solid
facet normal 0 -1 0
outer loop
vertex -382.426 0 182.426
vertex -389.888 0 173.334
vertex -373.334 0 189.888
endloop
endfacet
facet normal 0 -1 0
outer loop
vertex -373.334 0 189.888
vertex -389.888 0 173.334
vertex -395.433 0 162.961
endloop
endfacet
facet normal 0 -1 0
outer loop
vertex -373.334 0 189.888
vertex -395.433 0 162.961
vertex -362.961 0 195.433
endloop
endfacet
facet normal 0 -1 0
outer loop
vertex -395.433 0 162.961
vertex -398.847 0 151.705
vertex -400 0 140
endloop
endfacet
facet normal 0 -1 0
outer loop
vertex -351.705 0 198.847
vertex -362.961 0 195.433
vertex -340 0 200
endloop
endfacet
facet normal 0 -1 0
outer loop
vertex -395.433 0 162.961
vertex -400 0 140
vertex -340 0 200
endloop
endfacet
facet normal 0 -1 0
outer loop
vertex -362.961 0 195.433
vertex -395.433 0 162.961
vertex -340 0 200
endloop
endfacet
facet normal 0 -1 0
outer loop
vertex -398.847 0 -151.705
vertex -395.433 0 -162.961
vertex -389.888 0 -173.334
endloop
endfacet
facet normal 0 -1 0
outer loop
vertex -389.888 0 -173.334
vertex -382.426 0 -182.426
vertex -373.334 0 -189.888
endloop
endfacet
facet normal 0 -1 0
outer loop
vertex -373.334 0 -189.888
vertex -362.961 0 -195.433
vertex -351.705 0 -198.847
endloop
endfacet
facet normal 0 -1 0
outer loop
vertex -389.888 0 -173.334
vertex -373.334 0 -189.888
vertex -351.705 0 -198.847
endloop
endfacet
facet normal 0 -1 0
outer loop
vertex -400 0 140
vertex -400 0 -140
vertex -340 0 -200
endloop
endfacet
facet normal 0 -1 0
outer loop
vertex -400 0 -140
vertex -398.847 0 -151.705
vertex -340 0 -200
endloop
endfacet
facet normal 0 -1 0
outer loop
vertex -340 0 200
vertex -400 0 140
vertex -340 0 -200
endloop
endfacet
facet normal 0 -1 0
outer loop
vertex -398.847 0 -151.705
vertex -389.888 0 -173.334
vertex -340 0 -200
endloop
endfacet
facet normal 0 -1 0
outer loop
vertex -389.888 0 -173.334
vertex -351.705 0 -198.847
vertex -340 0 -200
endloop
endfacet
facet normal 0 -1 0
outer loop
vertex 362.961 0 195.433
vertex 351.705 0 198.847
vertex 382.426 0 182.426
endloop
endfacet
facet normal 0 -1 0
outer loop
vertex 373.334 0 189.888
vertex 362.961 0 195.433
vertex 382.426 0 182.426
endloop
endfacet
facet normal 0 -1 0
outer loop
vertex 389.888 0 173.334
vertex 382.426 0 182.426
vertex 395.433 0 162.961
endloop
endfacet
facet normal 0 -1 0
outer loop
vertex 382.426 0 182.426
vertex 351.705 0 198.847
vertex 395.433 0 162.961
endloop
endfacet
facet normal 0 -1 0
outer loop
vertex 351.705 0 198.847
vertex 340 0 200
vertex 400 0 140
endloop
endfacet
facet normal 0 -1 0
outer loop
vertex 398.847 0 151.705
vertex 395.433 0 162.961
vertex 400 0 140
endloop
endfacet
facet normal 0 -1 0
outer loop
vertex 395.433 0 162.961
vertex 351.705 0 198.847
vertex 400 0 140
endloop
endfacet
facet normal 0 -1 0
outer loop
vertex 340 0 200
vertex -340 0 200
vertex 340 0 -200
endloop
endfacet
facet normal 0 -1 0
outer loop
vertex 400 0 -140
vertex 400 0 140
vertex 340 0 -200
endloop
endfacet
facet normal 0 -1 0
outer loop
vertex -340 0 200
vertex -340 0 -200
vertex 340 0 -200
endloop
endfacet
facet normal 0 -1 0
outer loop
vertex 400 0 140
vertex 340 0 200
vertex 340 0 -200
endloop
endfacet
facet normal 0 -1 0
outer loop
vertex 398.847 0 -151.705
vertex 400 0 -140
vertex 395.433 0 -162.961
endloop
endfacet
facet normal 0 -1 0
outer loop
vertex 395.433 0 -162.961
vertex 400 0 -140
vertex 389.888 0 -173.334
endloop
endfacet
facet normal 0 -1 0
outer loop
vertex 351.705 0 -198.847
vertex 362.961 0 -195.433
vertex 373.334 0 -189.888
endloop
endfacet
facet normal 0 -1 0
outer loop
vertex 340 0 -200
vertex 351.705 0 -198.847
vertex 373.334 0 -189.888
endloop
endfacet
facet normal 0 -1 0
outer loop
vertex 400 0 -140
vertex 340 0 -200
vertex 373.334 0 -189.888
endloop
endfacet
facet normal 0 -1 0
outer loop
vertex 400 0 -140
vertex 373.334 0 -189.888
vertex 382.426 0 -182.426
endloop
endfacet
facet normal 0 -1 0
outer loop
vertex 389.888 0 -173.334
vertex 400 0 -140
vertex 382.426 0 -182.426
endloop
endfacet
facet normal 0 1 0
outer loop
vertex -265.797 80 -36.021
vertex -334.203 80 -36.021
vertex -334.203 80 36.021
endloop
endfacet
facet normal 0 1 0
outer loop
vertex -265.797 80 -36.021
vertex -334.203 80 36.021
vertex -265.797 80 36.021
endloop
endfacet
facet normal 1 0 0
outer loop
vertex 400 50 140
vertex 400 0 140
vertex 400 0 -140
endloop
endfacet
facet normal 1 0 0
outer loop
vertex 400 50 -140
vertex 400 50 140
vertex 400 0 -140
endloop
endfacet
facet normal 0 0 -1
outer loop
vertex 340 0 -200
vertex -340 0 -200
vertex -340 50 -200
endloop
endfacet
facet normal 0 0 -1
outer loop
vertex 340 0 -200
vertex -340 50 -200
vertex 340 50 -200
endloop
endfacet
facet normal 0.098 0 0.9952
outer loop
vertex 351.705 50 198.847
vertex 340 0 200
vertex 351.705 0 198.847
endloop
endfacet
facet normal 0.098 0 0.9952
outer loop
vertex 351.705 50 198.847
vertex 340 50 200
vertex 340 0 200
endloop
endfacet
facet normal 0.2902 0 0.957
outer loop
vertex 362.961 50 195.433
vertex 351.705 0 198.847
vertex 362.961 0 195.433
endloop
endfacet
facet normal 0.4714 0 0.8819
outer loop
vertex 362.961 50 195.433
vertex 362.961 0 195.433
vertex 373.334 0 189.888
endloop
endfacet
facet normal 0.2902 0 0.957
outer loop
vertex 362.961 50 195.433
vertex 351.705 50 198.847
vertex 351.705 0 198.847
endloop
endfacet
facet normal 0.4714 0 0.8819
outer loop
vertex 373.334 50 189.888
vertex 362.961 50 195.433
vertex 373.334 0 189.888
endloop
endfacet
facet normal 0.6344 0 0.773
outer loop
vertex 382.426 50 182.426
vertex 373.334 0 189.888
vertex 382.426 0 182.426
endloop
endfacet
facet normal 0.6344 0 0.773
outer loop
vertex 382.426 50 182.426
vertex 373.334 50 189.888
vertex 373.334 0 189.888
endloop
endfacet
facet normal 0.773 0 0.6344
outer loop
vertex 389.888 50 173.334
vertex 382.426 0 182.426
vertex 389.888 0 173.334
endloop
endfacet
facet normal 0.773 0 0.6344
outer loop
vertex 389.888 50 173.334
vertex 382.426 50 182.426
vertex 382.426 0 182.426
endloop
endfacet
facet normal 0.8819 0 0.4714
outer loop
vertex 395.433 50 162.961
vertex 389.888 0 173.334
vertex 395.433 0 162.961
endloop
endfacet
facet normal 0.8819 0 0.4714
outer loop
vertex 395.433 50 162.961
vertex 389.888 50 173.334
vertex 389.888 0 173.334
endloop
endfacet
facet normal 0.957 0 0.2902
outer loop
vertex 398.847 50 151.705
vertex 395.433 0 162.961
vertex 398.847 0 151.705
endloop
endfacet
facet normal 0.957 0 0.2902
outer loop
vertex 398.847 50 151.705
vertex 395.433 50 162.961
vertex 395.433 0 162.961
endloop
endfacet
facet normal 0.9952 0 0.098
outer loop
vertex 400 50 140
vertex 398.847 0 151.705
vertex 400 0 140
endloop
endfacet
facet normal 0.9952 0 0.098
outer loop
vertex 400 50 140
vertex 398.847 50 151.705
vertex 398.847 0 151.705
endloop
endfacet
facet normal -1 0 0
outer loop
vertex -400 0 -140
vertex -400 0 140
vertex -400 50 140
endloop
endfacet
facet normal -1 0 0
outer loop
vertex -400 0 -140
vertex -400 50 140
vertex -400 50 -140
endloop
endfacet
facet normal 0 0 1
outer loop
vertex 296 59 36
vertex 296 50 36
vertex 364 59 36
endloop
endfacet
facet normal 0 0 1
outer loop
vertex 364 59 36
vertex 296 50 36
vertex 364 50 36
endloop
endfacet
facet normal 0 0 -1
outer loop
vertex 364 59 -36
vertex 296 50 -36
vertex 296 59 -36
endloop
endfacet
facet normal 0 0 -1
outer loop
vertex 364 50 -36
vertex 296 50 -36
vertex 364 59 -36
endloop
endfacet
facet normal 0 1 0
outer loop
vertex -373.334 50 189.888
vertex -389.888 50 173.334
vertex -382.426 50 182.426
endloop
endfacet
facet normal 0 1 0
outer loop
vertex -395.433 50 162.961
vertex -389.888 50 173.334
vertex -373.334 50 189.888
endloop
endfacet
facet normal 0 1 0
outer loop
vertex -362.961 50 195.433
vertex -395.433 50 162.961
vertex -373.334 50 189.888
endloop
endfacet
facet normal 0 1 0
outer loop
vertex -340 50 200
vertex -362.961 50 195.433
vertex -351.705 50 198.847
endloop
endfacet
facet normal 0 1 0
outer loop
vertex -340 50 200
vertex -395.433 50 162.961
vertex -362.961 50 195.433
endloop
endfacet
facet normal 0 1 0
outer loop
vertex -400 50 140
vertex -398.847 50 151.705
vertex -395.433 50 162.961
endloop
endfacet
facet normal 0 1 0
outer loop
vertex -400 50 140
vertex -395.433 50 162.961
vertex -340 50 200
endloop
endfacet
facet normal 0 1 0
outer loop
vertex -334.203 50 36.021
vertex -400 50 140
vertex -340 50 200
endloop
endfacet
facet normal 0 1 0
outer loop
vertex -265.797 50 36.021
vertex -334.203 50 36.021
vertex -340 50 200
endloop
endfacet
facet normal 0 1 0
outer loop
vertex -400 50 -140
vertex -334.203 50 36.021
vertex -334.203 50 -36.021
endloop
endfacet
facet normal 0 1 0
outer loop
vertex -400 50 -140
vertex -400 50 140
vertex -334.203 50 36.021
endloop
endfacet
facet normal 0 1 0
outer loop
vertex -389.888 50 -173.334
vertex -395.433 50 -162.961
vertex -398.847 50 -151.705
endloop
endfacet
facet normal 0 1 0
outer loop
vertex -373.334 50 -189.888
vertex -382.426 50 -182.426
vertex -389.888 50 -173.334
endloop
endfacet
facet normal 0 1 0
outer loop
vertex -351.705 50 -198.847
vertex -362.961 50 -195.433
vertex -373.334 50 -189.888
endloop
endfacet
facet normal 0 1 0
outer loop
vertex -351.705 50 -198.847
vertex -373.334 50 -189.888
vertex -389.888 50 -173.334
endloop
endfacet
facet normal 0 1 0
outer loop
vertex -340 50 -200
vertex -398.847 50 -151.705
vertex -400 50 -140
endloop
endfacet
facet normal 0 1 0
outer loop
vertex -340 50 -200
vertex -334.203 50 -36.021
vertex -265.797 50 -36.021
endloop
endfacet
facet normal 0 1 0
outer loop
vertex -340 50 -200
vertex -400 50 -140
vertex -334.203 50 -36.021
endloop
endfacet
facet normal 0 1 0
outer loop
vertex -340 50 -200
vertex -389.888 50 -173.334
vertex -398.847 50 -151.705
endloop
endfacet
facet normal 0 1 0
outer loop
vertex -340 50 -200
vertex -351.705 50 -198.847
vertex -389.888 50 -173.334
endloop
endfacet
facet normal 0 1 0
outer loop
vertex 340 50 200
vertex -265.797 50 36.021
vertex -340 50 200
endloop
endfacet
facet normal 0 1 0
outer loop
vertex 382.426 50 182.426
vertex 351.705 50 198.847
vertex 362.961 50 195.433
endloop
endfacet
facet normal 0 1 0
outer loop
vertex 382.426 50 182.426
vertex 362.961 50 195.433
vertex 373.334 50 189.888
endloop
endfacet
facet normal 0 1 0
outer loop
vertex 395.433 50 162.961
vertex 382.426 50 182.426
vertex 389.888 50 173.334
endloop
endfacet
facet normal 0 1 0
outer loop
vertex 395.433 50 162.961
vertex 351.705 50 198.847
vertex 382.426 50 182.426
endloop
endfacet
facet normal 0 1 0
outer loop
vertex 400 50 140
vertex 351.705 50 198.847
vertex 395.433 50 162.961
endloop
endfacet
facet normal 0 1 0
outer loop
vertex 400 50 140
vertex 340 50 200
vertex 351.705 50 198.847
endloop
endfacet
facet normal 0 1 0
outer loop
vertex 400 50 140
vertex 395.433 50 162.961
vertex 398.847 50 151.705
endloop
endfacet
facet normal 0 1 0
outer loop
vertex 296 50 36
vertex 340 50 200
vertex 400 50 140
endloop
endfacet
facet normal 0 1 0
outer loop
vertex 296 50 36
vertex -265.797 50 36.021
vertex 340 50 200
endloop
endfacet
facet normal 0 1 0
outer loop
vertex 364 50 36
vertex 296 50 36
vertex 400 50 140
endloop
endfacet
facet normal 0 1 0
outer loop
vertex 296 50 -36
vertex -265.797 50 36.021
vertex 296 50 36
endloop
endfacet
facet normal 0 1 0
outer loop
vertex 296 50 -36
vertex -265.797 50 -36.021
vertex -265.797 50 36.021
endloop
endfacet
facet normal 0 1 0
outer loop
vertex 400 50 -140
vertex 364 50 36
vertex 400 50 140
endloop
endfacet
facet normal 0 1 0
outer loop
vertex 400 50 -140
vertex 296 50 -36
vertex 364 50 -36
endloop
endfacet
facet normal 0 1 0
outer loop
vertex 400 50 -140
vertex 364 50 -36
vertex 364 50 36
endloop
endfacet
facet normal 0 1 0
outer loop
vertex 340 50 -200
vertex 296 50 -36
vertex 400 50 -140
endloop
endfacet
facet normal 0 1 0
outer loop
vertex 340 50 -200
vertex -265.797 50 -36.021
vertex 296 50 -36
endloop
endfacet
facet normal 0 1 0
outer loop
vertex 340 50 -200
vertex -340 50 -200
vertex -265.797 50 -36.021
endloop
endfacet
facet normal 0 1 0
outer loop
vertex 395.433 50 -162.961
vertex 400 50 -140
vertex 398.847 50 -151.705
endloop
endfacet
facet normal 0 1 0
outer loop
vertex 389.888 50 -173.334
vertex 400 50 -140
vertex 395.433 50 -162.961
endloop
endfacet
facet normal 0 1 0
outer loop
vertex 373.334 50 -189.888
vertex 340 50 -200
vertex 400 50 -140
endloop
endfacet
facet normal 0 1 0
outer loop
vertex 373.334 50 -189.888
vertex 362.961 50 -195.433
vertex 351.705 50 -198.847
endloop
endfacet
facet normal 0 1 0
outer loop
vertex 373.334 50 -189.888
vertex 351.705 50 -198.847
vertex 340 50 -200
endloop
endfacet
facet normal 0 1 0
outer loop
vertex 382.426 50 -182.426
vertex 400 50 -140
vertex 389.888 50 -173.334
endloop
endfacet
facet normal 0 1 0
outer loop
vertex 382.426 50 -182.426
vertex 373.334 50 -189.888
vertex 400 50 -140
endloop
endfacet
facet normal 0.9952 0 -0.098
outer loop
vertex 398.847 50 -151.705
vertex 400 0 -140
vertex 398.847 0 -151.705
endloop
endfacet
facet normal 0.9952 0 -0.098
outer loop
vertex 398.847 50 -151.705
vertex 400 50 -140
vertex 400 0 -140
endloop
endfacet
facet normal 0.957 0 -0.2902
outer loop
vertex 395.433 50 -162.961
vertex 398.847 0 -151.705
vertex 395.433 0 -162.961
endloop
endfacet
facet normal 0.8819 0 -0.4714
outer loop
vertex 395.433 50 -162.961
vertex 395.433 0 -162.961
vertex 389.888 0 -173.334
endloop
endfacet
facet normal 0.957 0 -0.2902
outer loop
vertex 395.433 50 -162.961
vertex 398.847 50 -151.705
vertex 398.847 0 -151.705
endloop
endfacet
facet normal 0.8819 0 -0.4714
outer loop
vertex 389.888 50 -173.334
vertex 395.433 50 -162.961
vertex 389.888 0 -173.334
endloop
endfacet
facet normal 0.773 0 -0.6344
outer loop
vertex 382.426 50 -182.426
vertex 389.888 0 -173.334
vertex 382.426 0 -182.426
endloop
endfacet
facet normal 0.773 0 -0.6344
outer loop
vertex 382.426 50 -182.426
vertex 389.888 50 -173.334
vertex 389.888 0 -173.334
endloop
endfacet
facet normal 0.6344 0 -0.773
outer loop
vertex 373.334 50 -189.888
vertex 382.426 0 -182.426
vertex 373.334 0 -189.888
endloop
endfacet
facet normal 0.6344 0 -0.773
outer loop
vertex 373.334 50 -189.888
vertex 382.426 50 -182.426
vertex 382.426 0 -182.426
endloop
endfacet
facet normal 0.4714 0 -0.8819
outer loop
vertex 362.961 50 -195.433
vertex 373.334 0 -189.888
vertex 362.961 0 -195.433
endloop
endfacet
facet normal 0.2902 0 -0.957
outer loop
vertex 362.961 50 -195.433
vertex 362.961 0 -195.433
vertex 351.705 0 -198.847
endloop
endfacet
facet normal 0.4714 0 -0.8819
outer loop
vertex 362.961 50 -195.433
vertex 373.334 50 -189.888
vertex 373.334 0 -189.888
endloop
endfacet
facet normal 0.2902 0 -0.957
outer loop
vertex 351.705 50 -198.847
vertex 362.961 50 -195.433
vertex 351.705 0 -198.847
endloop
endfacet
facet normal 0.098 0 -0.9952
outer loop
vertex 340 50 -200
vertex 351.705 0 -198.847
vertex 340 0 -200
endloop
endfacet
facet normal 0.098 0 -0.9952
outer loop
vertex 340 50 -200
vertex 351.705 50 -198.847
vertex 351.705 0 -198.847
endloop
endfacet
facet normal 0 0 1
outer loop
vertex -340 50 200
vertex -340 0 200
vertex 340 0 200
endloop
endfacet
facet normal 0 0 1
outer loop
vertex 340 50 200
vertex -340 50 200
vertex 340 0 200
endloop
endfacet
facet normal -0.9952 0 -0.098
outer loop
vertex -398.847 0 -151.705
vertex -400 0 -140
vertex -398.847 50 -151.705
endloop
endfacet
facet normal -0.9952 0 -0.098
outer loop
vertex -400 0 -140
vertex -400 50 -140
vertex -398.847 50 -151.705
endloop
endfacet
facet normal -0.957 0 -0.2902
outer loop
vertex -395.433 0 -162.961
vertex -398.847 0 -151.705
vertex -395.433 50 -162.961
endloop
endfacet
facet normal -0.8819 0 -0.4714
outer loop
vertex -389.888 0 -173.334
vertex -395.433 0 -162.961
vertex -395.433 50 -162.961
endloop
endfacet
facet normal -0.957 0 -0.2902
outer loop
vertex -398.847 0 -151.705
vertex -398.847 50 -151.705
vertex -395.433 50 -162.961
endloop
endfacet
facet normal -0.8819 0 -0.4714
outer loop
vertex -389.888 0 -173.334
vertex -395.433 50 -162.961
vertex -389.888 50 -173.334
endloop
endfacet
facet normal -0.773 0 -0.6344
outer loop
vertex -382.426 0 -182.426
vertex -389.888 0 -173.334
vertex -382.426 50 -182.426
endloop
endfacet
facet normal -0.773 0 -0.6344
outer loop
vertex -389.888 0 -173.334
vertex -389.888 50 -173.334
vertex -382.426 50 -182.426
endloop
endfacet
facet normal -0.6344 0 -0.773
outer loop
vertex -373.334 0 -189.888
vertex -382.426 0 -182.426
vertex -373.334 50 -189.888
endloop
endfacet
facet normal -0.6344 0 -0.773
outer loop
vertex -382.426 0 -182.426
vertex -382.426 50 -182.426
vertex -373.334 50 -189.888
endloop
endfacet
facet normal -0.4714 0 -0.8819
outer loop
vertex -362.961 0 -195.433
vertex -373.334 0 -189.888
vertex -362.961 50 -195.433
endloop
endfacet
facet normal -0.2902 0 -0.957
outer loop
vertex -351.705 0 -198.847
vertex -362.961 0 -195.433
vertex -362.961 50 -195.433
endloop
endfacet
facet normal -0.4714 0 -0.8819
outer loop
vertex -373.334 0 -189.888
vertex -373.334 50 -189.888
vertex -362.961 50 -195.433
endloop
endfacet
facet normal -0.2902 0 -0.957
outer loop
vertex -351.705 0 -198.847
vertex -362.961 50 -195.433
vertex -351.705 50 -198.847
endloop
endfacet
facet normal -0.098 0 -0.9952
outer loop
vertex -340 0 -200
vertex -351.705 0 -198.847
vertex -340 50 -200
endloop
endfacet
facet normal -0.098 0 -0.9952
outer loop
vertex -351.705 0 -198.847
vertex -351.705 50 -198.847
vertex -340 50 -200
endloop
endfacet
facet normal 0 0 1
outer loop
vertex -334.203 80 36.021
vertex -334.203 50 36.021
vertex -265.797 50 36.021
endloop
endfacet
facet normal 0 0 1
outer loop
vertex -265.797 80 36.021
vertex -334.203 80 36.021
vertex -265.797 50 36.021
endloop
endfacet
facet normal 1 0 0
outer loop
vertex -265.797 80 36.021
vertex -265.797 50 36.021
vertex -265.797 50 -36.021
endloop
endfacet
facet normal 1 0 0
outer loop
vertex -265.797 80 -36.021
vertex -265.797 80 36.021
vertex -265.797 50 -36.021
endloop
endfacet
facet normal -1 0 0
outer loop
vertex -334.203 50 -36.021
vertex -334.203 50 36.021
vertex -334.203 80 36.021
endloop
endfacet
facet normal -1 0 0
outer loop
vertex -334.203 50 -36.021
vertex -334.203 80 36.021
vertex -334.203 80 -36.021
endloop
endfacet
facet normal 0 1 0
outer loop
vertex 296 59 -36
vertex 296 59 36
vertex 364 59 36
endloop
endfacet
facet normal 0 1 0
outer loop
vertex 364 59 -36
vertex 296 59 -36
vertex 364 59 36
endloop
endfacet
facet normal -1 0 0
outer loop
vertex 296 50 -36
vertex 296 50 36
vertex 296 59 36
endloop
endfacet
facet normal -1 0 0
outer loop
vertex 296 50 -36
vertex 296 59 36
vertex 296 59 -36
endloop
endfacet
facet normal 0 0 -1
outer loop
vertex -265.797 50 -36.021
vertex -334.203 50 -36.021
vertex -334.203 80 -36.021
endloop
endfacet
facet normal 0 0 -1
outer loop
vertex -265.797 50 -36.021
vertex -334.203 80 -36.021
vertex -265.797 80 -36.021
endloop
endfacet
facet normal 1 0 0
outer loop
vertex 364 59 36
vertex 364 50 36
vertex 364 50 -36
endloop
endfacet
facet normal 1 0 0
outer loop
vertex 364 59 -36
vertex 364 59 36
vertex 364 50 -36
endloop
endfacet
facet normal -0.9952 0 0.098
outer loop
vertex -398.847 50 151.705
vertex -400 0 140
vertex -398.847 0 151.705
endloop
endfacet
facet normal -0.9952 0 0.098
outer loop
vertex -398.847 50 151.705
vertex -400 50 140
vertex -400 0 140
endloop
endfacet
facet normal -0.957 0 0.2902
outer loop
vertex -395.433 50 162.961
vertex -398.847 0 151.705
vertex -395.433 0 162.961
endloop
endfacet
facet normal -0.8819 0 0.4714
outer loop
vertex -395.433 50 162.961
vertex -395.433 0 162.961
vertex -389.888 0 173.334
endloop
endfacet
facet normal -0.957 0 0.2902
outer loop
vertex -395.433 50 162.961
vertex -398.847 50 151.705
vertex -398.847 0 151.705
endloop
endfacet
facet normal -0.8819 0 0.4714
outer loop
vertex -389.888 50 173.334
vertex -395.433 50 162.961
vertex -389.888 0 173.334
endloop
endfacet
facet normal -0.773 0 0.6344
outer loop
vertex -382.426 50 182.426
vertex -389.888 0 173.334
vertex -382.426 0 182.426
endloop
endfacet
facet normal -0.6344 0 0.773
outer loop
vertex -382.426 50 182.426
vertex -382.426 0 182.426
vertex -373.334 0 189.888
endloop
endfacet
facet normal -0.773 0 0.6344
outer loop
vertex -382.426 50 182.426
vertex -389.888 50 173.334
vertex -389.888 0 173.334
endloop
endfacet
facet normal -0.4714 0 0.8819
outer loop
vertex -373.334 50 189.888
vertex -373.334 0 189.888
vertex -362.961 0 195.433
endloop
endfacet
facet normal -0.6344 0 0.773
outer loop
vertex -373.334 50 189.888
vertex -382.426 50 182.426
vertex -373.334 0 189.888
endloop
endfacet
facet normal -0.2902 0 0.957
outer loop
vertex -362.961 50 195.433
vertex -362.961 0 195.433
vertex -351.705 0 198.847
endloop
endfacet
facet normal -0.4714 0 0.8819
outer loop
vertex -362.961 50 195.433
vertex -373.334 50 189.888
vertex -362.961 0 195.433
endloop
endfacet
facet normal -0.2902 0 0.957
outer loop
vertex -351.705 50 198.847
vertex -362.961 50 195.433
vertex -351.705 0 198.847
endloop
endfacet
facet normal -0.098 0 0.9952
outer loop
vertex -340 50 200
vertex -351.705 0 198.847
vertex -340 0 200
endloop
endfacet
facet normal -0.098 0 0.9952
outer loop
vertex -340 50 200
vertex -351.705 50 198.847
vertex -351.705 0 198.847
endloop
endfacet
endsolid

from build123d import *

# Parameters (mm, degrees)
SKETCH1_W           = 800
SKETCH1_H           = 400
BOSS_EXTRUDE1_DEPTH = 50
FILLET1_R           = 60
SKETCH3_W           = 68.405794472
SKETCH3_H           = 72.041840608
BOSS_EXTRUDE2_DEPTH = 30
SKETCH5_W           = 68
SKETCH5_H           = 72
BOSS_EXTRUDE3_DEPTH = 9


with BuildPart() as part:
    # Sketch1 → Boss-Extrude1 (new body)
    with BuildSketch(Plane(origin=(0, 0, 0), x_dir=(1, 0, 0), z_dir=(0, 1, 0))):
        Rectangle(SKETCH1_W, SKETCH1_H)
    extrude(amount=BOSS_EXTRUDE1_DEPTH)

    # Fillet1
    fillet1_edges = [part.edges().sort_by_distance(p)[0] for p in [
        (400, 25, 200),
        (-400, 25, 200),
        (-400, 25, -200),
        (400, 25, -200),
    ]]
    fillet(fillet1_edges, radius=FILLET1_R)

    # Sketch3 → Boss-Extrude2 (add)
    with BuildSketch(Plane(origin=(0, 50, 0), x_dir=(1, 0, 0), z_dir=(0, 1, 0))):
        with Locations((-300, 0)):
            Rectangle(SKETCH3_W, SKETCH3_H)
    extrude(amount=BOSS_EXTRUDE2_DEPTH)

    # Sketch5 → Boss-Extrude3 (add)
    with BuildSketch(Plane(origin=(0, 50, 0), x_dir=(1, 0, 0), z_dir=(0, 1, 0))):
        with Locations((330, 0)):
            Rectangle(SKETCH5_W, SKETCH5_H)
    extrude(amount=BOSS_EXTRUDE3_DEPTH)


solid = part.part
